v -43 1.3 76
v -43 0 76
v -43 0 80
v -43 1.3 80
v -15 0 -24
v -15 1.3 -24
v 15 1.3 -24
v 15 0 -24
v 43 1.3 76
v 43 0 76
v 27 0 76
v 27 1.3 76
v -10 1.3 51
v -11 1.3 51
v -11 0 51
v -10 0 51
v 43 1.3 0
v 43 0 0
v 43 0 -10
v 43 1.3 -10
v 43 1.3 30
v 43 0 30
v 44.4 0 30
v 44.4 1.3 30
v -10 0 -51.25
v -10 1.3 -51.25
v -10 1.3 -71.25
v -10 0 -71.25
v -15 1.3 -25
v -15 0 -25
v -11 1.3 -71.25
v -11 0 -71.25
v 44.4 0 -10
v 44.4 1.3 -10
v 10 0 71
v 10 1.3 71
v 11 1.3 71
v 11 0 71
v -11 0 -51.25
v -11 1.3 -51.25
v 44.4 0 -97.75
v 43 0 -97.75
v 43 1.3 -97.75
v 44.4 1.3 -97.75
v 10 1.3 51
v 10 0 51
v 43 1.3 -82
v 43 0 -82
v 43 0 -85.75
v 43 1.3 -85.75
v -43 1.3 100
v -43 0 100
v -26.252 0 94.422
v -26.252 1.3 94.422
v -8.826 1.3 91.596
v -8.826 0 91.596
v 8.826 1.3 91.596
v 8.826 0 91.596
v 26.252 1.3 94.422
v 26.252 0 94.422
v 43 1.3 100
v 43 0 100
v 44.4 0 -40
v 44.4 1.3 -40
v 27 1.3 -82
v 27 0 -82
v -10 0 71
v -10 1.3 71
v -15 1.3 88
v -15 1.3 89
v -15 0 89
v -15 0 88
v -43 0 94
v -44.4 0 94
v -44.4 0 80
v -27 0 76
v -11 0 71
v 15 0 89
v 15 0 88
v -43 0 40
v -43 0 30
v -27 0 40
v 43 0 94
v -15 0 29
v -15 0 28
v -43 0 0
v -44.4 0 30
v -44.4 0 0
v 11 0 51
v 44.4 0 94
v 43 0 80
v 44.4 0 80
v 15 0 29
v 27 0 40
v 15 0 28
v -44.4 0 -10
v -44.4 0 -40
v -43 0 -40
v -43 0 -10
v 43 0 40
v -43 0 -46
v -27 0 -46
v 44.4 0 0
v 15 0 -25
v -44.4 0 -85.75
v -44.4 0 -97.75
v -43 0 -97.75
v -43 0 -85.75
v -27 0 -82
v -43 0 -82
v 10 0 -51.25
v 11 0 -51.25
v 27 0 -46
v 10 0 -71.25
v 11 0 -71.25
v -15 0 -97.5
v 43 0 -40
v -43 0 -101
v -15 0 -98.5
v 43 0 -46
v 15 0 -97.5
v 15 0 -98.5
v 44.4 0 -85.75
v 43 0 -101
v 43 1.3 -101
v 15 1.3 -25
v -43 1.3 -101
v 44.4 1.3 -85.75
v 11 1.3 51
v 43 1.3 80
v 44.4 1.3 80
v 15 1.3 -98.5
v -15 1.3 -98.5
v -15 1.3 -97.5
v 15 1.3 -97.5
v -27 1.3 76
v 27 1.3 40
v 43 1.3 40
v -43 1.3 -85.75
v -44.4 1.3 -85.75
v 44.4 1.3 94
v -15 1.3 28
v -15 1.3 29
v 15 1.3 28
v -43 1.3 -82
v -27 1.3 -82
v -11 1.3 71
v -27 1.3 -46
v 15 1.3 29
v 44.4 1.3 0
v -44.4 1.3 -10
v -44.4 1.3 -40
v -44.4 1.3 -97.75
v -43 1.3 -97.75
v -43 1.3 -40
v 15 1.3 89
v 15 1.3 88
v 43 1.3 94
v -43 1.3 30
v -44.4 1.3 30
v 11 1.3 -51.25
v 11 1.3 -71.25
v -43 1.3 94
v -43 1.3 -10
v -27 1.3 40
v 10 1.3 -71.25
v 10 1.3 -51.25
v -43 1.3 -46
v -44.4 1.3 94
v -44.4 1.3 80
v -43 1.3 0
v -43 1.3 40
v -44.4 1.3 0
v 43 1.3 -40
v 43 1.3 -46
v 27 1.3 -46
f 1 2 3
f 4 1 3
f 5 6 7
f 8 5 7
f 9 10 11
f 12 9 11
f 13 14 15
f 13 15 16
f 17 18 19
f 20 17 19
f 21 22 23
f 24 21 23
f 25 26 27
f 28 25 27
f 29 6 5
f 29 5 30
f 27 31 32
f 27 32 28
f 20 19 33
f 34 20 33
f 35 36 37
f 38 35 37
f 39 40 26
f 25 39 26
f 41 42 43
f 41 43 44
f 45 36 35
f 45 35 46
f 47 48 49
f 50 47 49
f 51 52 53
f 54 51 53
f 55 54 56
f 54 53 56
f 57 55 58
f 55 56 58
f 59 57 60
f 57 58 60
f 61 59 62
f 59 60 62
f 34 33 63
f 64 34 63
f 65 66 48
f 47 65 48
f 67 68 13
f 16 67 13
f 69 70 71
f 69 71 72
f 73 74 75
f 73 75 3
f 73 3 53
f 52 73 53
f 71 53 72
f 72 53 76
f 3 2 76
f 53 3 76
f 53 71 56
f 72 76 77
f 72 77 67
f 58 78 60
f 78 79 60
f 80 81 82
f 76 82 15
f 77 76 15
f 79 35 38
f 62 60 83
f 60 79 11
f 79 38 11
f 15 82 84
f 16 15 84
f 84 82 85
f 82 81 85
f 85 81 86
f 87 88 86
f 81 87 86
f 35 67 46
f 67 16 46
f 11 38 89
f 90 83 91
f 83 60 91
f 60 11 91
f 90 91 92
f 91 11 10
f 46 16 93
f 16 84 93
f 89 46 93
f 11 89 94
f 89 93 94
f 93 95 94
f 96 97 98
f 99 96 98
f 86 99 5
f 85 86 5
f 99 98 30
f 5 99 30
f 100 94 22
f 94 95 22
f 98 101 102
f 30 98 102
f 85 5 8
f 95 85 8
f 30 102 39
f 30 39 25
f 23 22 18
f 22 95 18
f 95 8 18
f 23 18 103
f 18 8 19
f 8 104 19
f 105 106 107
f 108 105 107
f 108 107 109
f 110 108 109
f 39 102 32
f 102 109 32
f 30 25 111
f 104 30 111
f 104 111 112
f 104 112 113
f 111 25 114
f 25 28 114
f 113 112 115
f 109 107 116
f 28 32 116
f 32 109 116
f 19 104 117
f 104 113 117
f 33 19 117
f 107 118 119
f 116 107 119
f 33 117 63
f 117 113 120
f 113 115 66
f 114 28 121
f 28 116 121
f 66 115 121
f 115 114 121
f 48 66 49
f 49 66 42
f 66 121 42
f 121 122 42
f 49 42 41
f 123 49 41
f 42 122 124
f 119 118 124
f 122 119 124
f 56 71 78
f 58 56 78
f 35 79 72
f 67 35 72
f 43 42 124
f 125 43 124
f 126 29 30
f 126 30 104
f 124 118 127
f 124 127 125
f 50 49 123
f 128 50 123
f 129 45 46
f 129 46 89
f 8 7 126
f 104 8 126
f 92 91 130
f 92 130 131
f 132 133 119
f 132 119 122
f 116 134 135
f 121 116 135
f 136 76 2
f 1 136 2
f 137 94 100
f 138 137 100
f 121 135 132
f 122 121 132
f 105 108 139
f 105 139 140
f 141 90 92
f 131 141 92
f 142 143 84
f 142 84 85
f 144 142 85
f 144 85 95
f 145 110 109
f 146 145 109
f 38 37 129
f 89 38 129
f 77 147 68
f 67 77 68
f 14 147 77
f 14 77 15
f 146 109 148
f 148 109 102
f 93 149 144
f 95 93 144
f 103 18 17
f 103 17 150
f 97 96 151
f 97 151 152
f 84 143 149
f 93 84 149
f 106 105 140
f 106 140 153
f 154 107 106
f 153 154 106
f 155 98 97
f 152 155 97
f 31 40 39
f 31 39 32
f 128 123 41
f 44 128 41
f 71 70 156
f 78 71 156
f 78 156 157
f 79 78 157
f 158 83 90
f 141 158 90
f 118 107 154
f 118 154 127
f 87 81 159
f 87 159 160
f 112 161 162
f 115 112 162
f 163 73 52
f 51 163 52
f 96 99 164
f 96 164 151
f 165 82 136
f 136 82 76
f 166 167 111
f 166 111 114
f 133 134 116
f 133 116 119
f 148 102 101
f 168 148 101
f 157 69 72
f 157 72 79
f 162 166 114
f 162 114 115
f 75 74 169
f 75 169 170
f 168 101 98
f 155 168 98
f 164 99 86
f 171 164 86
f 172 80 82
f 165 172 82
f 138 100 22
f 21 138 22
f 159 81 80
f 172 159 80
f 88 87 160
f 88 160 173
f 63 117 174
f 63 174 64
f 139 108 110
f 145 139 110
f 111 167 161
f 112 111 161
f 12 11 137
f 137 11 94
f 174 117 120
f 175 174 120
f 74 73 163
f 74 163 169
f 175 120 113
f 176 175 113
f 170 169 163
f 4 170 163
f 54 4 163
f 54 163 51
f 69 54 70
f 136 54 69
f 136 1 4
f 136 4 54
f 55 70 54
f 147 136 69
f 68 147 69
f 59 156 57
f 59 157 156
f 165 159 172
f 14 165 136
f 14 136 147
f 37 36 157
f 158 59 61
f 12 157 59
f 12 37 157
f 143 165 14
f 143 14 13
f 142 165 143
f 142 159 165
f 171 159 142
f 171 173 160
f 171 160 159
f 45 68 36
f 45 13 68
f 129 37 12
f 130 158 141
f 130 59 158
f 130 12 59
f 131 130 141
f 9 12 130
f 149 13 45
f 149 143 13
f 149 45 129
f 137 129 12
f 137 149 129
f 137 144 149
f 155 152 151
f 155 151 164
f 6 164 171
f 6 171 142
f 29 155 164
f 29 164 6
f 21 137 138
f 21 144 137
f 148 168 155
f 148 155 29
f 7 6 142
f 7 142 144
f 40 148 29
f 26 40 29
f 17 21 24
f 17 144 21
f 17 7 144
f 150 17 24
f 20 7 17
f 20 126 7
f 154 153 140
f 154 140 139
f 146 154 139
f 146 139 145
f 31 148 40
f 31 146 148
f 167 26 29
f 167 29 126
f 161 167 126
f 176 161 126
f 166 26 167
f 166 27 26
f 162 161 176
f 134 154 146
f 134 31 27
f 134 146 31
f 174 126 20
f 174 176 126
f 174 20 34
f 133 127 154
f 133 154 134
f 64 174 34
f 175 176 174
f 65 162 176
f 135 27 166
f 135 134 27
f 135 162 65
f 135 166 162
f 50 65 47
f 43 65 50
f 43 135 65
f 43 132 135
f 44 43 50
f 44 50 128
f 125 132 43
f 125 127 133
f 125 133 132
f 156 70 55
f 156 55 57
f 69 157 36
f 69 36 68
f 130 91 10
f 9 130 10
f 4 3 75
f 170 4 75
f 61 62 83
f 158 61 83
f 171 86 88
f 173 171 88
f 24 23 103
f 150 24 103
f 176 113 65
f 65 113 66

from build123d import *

# Parameters (mm, degrees)
BOSS_EXTRUDE1_DEPTH = 1.3
SKETCH2_W           = 1.4
SKETCH2_H           = 12
SKETCH2_H_2         = 30
SKETCH2_H_3         = 14
BOSS_EXTRUDE2_DEPTH = 1.3
SKETCH3_W           = 30
SKETCH3_H           = 1
CUT_EXTRUDE1_DEPTH  = 110.421433001
SKETCH4_W           = 30
SKETCH4_H           = 1
CUT_EXTRUDE2_DEPTH  = 110.421433001
SKETCH6_W           = 30
SKETCH6_H           = 1
CUT_EXTRUDE3_DEPTH  = 110.421433001
SKETCH7_W           = 1
SKETCH7_H           = 20
SKETCH7_W_2         = 30
SKETCH7_H_2         = 1
CUT_EXTRUDE4_DEPTH  = 110.421433001
SKETCH8_W           = 1
SKETCH8_H           = 20
CUT_EXTRUDE5_DEPTH  = 110.421433001
SKETCH9_W           = 86
SKETCH9_H           = 1
BOSS_EXTRUDE3_DEPTH = 1.3


with BuildPart() as part:
    # Sketch1 → Boss-Extrude1 (new body)
    with BuildSketch(Plane(origin=(0, 0, 0), x_dir=(1, 0, 0), z_dir=(0, 1, 0))):
        with BuildLine():
            Line((43, 100), (-43, 100))
            Line((-43, 100), (-43, 82))
            Line((-43, 82), (-27, 82))
            Line((-27, 82), (-27, 46))
            Line((-27, 46), (-43, 46))
            Line((-43, 46), (-43, -40))
            Line((-43, -40), (-27, -40))
            Line((-27, -40), (-27, -76))
            Line((-27, -76), (-43, -76))
            Line((-43, -76), (-43, -100))
            ThreePointArc((-43, -100), (0, -91.240962318), (43, -100))
            Line((43, -100), (43, -76))
            Line((43, -76), (27, -76))
            Line((27, -76), (27, -40))
            Line((27, -40), (43, -40))
            Line((43, -40), (43, 46))
            Line((43, 46), (27, 46))
            Line((27, 46), (27, 82))
            Line((27, 82), (43, 82))
            Line((43, 82), (43, 100))
        make_face()
    extrude(amount=BOSS_EXTRUDE1_DEPTH)

    # Sketch2 → Boss-Extrude2 (add)
    with BuildSketch(Plane(origin=(0, 0, 0), x_dir=(1, 0, 0), z_dir=(0, 1, 0))):
        with Locations((43.7, 91.75)):
            Rectangle(SKETCH2_W, SKETCH2_H)
        with Locations((43.7, 25)):
            Rectangle(SKETCH2_W, SKETCH2_H_2)
        with Locations((43.7, -87)):
            Rectangle(SKETCH2_W, SKETCH2_H_3)
        with Locations((43.7, -15)):
            Rectangle(SKETCH2_W, SKETCH2_H_2)
    boss_extrude2 = extrude(amount=BOSS_EXTRUDE2_DEPTH)

    # Mirror1: Boss-Extrude2 across plane
    add(boss_extrude2.mirror(Plane(origin=(0, 0, 0), x_dir=(0, 0, 1), z_dir=(1, 0, 0))))

    # Sketch3 → Cut-Extrude1 (cut, through all)
    with BuildSketch(Plane(origin=(0, 1.3, 0), x_dir=(1, 0, 0), z_dir=(0, 1, 0))):
        with Locations((0, 98)):
            Rectangle(SKETCH3_W, SKETCH3_H)
    extrude(amount=-CUT_EXTRUDE1_DEPTH, mode=Mode.SUBTRACT)

    # Sketch4 → Cut-Extrude2 (cut, through all)
    with BuildSketch(Plane(origin=(0, 1.3, 0), x_dir=(1, 0, 0), z_dir=(0, 1, 0))):
        with Locations((0, -88.5)):
            Rectangle(SKETCH4_W, SKETCH4_H)
    extrude(amount=-CUT_EXTRUDE2_DEPTH, mode=Mode.SUBTRACT)

    # Sketch6 → Cut-Extrude3 (cut, through all)
    with BuildSketch(Plane(origin=(0, 1.3, 0), x_dir=(1, 0, 0), z_dir=(0, 1, 0))):
        with Locations((0, 24.5)):
            Rectangle(SKETCH6_W, SKETCH6_H)
    extrude(amount=-CUT_EXTRUDE3_DEPTH, mode=Mode.SUBTRACT)

    # Sketch7 → Cut-Extrude4 (cut, through all)
    with BuildSketch(Plane(origin=(0, 1.3, 0), x_dir=(1, 0, 0), z_dir=(0, 1, 0))):
        with Locations((-10.5, -61)):
            Rectangle(SKETCH7_W, SKETCH7_H)
        with Locations((10.5, -61)):
            Rectangle(SKETCH7_W, SKETCH7_H)
        with Locations((0, -28.5)):
            Rectangle(SKETCH7_W_2, SKETCH7_H_2)
    extrude(amount=-CUT_EXTRUDE4_DEPTH, mode=Mode.SUBTRACT)

    # Sketch8 → Cut-Extrude5 (cut, through all)
    with BuildSketch(Plane(origin=(0, 1.3, 0), x_dir=(1, 0, 0), z_dir=(0, 1, 0))):
        with Locations((-10.5, 61.25)):
            Rectangle(SKETCH8_W, SKETCH8_H)
        with Locations((10.5, 61.25)):
            Rectangle(SKETCH8_W, SKETCH8_H)
    extrude(amount=-CUT_EXTRUDE5_DEPTH, mode=Mode.SUBTRACT)

    # Sketch9 → Boss-Extrude3 (add)
    with BuildSketch(Plane(origin=(0, 0, 0), x_dir=(1, 0, 0), z_dir=(0, 1, 0))):
        with Locations((0, 100.5)):
            Rectangle(SKETCH9_W, SKETCH9_H)
    extrude(amount=BOSS_EXTRUDE3_DEPTH)


solid = part.part
